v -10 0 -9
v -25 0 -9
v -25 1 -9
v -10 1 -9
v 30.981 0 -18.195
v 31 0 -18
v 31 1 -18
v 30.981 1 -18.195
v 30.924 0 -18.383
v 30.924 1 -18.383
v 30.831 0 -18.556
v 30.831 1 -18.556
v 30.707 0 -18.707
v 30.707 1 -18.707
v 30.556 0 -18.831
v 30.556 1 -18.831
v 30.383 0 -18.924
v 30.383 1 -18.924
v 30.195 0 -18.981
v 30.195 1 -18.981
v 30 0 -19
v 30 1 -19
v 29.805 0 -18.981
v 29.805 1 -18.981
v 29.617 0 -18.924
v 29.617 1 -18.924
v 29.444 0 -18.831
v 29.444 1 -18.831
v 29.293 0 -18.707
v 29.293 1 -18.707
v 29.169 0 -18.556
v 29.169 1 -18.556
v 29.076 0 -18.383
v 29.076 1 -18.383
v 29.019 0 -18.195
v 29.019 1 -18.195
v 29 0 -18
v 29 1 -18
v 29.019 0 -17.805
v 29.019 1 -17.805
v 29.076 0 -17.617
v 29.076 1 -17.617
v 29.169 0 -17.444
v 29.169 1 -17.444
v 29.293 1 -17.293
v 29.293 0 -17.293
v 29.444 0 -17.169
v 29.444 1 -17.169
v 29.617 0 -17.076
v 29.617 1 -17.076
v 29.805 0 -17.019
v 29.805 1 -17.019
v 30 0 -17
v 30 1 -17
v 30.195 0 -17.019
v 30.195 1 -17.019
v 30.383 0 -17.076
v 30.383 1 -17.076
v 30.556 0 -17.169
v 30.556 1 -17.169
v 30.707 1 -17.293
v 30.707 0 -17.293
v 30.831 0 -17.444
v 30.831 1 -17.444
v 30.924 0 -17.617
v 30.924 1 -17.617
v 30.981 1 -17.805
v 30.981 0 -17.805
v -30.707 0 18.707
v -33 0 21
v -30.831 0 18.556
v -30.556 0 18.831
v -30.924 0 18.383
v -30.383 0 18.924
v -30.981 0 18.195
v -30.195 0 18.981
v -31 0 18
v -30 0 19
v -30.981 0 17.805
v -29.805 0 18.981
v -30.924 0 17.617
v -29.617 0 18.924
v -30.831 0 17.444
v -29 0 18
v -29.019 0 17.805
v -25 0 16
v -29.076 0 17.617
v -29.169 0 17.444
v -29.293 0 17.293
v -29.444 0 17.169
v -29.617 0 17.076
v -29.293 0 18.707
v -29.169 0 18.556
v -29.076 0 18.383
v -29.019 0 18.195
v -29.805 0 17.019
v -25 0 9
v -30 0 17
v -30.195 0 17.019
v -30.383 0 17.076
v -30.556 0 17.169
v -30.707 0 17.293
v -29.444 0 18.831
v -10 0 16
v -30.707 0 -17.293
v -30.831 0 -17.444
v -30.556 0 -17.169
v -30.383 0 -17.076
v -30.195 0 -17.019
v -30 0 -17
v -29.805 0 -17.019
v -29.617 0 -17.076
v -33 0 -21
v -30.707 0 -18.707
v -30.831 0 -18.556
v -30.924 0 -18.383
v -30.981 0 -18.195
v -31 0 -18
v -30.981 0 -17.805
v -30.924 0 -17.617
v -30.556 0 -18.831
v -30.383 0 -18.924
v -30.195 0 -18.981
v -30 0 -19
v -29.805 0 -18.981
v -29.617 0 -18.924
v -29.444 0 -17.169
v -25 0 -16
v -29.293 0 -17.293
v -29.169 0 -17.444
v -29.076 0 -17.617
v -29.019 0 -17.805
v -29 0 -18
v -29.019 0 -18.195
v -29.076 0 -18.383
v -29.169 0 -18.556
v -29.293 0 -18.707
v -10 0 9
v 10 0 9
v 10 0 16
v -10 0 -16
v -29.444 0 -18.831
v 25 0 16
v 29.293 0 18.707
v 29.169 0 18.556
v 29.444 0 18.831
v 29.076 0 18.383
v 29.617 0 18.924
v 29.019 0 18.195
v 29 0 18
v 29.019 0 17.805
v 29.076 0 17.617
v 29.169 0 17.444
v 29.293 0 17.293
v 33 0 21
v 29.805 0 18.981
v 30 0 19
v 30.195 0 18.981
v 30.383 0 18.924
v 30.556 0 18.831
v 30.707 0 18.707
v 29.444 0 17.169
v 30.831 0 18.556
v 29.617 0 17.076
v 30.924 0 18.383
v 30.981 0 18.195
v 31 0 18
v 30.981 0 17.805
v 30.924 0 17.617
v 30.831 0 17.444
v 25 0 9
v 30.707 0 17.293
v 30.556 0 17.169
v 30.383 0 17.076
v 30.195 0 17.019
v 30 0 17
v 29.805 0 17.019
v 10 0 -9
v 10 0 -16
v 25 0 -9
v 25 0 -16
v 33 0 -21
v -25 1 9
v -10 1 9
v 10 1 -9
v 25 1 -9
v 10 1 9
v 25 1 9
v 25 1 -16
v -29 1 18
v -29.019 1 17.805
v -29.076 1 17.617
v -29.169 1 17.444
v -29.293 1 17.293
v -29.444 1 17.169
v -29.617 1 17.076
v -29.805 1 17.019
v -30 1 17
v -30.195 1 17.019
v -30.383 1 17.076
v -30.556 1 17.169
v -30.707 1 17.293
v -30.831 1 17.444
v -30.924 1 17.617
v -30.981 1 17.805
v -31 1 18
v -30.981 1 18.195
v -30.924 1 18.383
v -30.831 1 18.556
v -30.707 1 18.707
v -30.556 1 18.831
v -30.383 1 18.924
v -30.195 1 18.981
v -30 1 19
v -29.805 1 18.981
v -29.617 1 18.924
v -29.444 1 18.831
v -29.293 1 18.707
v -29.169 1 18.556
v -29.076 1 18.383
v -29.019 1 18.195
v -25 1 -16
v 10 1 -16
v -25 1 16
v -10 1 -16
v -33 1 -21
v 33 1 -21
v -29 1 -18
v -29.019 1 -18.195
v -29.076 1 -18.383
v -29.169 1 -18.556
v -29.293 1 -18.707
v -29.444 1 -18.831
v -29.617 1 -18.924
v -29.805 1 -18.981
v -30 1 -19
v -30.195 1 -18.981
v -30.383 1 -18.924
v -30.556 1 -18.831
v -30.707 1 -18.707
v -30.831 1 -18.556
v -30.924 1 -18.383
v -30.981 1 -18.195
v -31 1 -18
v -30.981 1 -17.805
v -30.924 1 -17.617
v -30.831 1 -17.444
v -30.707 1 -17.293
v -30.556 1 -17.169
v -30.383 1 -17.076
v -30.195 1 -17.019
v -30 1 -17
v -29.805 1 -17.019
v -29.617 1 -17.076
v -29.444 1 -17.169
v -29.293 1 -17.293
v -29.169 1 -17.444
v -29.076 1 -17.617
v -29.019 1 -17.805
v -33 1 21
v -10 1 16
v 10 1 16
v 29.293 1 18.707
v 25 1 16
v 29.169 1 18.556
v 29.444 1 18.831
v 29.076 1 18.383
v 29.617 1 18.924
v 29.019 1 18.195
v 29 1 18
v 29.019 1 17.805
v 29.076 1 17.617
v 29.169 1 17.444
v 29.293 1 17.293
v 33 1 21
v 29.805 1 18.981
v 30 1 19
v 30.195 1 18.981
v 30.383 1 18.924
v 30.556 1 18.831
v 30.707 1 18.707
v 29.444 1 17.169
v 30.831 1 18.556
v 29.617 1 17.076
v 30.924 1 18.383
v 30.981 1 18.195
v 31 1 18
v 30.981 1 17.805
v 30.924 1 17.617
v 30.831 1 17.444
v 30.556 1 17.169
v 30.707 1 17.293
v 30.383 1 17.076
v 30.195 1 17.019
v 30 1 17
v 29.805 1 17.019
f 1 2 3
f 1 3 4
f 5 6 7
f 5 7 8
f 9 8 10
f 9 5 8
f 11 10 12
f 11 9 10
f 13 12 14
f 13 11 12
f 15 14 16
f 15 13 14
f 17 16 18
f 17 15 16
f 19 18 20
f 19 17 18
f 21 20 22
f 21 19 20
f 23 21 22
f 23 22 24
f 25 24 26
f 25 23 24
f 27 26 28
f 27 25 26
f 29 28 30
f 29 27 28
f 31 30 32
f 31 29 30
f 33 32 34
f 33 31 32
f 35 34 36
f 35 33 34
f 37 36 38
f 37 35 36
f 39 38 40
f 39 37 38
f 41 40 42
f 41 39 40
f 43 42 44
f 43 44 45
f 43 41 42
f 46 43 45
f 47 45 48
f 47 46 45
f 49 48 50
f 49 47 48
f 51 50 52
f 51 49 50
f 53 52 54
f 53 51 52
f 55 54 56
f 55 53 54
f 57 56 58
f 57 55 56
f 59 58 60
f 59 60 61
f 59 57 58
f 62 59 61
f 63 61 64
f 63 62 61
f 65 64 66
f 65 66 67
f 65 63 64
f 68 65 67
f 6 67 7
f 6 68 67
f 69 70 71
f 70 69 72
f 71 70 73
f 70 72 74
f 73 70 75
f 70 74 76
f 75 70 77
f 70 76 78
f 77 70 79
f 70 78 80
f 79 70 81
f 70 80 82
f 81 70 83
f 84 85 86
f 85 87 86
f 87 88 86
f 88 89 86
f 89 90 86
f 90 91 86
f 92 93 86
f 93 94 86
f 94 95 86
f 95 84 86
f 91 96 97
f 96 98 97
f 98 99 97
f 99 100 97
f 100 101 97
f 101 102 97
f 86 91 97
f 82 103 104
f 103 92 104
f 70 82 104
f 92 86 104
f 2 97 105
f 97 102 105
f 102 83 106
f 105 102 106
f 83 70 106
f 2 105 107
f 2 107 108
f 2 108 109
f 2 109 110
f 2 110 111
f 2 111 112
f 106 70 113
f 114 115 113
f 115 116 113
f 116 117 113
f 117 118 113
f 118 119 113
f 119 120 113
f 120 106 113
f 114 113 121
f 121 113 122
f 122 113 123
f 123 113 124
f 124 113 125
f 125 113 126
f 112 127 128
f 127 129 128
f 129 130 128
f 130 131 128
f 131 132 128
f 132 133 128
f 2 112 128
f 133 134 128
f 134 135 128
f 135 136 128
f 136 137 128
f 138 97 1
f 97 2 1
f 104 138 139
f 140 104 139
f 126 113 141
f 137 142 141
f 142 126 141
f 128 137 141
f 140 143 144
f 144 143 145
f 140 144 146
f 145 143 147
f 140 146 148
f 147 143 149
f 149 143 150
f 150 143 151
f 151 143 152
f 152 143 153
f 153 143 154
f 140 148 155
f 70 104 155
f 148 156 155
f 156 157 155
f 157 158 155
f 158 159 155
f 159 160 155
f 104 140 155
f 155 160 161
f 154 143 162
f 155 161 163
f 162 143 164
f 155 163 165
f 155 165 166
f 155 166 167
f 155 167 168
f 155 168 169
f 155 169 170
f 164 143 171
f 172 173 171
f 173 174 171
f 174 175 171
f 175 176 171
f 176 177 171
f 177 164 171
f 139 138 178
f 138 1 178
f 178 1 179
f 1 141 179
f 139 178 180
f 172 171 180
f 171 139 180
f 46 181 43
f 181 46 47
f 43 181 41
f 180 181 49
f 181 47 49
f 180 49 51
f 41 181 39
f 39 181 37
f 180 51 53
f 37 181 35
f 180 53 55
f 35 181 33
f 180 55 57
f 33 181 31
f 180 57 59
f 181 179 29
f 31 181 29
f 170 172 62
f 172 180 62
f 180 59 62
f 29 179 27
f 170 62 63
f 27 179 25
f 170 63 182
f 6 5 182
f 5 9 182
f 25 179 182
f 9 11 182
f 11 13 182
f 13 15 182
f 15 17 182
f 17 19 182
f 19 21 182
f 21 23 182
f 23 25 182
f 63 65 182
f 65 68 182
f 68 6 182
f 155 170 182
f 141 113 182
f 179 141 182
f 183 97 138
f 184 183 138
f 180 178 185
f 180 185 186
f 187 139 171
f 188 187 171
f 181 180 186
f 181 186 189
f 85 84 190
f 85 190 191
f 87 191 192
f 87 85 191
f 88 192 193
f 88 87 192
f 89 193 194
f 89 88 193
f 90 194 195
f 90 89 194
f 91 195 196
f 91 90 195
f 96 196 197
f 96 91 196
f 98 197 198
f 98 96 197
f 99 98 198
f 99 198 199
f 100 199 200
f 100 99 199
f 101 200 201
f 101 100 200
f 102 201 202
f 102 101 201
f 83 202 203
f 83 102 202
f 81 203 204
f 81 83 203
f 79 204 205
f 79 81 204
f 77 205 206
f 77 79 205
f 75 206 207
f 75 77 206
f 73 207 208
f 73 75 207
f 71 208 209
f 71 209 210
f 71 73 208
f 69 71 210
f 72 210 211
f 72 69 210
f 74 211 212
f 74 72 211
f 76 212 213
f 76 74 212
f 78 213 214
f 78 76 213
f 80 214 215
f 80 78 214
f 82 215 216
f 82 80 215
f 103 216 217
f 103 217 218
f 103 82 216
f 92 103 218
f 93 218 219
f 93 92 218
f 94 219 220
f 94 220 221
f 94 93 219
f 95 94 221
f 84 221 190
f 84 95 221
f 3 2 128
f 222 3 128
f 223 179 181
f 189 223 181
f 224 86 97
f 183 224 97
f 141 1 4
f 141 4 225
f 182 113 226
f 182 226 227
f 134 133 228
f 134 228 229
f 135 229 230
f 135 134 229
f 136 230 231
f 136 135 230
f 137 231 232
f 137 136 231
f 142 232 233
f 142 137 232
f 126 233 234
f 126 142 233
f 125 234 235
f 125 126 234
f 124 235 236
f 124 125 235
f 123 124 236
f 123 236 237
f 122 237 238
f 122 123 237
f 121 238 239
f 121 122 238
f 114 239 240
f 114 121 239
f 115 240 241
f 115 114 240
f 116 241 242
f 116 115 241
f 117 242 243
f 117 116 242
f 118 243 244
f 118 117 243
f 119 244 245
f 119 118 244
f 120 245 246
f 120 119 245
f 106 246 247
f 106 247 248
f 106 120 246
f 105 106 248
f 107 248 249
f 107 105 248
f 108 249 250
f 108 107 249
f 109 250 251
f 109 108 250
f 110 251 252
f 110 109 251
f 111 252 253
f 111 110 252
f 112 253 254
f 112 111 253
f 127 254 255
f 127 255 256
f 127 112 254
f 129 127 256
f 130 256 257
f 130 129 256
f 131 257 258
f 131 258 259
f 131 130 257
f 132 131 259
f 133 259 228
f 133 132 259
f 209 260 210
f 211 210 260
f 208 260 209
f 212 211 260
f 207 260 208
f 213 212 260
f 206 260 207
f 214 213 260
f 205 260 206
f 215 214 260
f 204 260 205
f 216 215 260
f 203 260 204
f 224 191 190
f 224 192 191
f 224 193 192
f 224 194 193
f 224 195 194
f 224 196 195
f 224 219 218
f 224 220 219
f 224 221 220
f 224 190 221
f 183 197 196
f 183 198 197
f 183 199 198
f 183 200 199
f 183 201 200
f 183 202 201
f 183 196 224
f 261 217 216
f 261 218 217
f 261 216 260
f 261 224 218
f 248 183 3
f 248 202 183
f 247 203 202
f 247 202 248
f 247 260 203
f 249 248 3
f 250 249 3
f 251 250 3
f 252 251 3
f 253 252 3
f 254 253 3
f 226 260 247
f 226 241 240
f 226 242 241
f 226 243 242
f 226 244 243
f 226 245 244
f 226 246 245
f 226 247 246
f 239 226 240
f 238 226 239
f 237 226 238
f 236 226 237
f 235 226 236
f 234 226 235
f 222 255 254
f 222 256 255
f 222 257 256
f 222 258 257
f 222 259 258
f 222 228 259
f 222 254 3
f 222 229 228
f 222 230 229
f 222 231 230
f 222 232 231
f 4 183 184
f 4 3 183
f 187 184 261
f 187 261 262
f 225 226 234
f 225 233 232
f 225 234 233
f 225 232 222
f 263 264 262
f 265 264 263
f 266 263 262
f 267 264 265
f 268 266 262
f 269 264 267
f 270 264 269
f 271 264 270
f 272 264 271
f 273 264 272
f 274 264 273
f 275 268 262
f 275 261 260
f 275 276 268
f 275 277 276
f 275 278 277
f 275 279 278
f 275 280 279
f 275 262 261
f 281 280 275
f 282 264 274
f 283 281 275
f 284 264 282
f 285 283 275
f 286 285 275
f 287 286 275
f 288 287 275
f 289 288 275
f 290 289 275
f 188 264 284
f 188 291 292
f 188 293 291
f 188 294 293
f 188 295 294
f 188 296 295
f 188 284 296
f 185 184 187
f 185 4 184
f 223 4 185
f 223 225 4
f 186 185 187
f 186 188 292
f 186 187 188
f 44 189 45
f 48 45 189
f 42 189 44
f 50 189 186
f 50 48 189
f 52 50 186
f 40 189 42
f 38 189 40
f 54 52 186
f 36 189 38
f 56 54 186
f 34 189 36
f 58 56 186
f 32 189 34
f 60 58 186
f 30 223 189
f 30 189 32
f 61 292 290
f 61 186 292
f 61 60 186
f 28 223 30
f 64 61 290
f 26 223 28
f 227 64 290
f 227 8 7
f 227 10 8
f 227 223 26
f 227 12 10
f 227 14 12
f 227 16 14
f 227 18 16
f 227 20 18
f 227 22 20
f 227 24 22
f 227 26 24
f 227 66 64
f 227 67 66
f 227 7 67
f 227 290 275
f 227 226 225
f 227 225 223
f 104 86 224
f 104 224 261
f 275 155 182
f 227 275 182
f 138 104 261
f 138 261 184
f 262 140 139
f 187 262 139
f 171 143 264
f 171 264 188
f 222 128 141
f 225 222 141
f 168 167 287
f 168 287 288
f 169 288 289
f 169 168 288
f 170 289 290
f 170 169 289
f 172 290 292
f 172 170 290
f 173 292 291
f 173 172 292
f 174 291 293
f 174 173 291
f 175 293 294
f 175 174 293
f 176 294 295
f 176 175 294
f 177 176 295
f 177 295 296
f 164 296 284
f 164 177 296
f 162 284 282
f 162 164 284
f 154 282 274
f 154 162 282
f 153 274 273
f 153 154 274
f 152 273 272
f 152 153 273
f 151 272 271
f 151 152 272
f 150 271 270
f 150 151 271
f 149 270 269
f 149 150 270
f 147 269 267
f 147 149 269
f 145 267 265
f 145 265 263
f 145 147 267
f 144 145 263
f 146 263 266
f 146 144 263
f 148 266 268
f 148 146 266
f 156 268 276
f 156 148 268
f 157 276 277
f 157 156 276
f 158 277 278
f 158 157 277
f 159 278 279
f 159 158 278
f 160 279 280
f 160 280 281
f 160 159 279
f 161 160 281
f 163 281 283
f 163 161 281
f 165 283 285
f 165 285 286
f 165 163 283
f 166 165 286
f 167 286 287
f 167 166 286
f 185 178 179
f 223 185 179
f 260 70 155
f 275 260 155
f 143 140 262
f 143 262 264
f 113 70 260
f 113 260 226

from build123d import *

# Parameters (mm, degrees)
SKETCH1_W           = 66
SKETCH1_H           = 42
SKETCH1_R           = 1
SKETCH1_W_2         = 15
SKETCH1_H_2         = 7
BOSS_EXTRUDE1_DEPTH = 1


with BuildPart() as part:
    # Sketch1 → Boss-Extrude1 (new body)
    with BuildSketch(Plane(origin=(0, 0, 0), x_dir=(1, 0, 0), z_dir=(0, 1, 0))):
        Rectangle(SKETCH1_W, SKETCH1_H)
        with Locations((-30, -18)):
            Circle(SKETCH1_R, mode=Mode.SUBTRACT)
        with Locations((30, -18)):
            Circle(SKETCH1_R, mode=Mode.SUBTRACT)
        with Locations((30, 18)):
            Circle(SKETCH1_R, mode=Mode.SUBTRACT)
        with Locations((-30, 18)):
            Circle(SKETCH1_R, mode=Mode.SUBTRACT)
        with Locations((-17.5, -12.5)):
            Rectangle(SKETCH1_W_2, SKETCH1_H_2, mode=Mode.SUBTRACT)
        with Locations((17.5, -12.5)):
            Rectangle(SKETCH1_W_2, SKETCH1_H_2, mode=Mode.SUBTRACT)
        with Locations((17.5, 12.5)):
            Rectangle(SKETCH1_W_2, SKETCH1_H_2, mode=Mode.SUBTRACT)
        with Locations((-17.5, 12.5)):
            Rectangle(SKETCH1_W_2, SKETCH1_H_2, mode=Mode.SUBTRACT)
    extrude(amount=BOSS_EXTRUDE1_DEPTH)


solid = part.part
